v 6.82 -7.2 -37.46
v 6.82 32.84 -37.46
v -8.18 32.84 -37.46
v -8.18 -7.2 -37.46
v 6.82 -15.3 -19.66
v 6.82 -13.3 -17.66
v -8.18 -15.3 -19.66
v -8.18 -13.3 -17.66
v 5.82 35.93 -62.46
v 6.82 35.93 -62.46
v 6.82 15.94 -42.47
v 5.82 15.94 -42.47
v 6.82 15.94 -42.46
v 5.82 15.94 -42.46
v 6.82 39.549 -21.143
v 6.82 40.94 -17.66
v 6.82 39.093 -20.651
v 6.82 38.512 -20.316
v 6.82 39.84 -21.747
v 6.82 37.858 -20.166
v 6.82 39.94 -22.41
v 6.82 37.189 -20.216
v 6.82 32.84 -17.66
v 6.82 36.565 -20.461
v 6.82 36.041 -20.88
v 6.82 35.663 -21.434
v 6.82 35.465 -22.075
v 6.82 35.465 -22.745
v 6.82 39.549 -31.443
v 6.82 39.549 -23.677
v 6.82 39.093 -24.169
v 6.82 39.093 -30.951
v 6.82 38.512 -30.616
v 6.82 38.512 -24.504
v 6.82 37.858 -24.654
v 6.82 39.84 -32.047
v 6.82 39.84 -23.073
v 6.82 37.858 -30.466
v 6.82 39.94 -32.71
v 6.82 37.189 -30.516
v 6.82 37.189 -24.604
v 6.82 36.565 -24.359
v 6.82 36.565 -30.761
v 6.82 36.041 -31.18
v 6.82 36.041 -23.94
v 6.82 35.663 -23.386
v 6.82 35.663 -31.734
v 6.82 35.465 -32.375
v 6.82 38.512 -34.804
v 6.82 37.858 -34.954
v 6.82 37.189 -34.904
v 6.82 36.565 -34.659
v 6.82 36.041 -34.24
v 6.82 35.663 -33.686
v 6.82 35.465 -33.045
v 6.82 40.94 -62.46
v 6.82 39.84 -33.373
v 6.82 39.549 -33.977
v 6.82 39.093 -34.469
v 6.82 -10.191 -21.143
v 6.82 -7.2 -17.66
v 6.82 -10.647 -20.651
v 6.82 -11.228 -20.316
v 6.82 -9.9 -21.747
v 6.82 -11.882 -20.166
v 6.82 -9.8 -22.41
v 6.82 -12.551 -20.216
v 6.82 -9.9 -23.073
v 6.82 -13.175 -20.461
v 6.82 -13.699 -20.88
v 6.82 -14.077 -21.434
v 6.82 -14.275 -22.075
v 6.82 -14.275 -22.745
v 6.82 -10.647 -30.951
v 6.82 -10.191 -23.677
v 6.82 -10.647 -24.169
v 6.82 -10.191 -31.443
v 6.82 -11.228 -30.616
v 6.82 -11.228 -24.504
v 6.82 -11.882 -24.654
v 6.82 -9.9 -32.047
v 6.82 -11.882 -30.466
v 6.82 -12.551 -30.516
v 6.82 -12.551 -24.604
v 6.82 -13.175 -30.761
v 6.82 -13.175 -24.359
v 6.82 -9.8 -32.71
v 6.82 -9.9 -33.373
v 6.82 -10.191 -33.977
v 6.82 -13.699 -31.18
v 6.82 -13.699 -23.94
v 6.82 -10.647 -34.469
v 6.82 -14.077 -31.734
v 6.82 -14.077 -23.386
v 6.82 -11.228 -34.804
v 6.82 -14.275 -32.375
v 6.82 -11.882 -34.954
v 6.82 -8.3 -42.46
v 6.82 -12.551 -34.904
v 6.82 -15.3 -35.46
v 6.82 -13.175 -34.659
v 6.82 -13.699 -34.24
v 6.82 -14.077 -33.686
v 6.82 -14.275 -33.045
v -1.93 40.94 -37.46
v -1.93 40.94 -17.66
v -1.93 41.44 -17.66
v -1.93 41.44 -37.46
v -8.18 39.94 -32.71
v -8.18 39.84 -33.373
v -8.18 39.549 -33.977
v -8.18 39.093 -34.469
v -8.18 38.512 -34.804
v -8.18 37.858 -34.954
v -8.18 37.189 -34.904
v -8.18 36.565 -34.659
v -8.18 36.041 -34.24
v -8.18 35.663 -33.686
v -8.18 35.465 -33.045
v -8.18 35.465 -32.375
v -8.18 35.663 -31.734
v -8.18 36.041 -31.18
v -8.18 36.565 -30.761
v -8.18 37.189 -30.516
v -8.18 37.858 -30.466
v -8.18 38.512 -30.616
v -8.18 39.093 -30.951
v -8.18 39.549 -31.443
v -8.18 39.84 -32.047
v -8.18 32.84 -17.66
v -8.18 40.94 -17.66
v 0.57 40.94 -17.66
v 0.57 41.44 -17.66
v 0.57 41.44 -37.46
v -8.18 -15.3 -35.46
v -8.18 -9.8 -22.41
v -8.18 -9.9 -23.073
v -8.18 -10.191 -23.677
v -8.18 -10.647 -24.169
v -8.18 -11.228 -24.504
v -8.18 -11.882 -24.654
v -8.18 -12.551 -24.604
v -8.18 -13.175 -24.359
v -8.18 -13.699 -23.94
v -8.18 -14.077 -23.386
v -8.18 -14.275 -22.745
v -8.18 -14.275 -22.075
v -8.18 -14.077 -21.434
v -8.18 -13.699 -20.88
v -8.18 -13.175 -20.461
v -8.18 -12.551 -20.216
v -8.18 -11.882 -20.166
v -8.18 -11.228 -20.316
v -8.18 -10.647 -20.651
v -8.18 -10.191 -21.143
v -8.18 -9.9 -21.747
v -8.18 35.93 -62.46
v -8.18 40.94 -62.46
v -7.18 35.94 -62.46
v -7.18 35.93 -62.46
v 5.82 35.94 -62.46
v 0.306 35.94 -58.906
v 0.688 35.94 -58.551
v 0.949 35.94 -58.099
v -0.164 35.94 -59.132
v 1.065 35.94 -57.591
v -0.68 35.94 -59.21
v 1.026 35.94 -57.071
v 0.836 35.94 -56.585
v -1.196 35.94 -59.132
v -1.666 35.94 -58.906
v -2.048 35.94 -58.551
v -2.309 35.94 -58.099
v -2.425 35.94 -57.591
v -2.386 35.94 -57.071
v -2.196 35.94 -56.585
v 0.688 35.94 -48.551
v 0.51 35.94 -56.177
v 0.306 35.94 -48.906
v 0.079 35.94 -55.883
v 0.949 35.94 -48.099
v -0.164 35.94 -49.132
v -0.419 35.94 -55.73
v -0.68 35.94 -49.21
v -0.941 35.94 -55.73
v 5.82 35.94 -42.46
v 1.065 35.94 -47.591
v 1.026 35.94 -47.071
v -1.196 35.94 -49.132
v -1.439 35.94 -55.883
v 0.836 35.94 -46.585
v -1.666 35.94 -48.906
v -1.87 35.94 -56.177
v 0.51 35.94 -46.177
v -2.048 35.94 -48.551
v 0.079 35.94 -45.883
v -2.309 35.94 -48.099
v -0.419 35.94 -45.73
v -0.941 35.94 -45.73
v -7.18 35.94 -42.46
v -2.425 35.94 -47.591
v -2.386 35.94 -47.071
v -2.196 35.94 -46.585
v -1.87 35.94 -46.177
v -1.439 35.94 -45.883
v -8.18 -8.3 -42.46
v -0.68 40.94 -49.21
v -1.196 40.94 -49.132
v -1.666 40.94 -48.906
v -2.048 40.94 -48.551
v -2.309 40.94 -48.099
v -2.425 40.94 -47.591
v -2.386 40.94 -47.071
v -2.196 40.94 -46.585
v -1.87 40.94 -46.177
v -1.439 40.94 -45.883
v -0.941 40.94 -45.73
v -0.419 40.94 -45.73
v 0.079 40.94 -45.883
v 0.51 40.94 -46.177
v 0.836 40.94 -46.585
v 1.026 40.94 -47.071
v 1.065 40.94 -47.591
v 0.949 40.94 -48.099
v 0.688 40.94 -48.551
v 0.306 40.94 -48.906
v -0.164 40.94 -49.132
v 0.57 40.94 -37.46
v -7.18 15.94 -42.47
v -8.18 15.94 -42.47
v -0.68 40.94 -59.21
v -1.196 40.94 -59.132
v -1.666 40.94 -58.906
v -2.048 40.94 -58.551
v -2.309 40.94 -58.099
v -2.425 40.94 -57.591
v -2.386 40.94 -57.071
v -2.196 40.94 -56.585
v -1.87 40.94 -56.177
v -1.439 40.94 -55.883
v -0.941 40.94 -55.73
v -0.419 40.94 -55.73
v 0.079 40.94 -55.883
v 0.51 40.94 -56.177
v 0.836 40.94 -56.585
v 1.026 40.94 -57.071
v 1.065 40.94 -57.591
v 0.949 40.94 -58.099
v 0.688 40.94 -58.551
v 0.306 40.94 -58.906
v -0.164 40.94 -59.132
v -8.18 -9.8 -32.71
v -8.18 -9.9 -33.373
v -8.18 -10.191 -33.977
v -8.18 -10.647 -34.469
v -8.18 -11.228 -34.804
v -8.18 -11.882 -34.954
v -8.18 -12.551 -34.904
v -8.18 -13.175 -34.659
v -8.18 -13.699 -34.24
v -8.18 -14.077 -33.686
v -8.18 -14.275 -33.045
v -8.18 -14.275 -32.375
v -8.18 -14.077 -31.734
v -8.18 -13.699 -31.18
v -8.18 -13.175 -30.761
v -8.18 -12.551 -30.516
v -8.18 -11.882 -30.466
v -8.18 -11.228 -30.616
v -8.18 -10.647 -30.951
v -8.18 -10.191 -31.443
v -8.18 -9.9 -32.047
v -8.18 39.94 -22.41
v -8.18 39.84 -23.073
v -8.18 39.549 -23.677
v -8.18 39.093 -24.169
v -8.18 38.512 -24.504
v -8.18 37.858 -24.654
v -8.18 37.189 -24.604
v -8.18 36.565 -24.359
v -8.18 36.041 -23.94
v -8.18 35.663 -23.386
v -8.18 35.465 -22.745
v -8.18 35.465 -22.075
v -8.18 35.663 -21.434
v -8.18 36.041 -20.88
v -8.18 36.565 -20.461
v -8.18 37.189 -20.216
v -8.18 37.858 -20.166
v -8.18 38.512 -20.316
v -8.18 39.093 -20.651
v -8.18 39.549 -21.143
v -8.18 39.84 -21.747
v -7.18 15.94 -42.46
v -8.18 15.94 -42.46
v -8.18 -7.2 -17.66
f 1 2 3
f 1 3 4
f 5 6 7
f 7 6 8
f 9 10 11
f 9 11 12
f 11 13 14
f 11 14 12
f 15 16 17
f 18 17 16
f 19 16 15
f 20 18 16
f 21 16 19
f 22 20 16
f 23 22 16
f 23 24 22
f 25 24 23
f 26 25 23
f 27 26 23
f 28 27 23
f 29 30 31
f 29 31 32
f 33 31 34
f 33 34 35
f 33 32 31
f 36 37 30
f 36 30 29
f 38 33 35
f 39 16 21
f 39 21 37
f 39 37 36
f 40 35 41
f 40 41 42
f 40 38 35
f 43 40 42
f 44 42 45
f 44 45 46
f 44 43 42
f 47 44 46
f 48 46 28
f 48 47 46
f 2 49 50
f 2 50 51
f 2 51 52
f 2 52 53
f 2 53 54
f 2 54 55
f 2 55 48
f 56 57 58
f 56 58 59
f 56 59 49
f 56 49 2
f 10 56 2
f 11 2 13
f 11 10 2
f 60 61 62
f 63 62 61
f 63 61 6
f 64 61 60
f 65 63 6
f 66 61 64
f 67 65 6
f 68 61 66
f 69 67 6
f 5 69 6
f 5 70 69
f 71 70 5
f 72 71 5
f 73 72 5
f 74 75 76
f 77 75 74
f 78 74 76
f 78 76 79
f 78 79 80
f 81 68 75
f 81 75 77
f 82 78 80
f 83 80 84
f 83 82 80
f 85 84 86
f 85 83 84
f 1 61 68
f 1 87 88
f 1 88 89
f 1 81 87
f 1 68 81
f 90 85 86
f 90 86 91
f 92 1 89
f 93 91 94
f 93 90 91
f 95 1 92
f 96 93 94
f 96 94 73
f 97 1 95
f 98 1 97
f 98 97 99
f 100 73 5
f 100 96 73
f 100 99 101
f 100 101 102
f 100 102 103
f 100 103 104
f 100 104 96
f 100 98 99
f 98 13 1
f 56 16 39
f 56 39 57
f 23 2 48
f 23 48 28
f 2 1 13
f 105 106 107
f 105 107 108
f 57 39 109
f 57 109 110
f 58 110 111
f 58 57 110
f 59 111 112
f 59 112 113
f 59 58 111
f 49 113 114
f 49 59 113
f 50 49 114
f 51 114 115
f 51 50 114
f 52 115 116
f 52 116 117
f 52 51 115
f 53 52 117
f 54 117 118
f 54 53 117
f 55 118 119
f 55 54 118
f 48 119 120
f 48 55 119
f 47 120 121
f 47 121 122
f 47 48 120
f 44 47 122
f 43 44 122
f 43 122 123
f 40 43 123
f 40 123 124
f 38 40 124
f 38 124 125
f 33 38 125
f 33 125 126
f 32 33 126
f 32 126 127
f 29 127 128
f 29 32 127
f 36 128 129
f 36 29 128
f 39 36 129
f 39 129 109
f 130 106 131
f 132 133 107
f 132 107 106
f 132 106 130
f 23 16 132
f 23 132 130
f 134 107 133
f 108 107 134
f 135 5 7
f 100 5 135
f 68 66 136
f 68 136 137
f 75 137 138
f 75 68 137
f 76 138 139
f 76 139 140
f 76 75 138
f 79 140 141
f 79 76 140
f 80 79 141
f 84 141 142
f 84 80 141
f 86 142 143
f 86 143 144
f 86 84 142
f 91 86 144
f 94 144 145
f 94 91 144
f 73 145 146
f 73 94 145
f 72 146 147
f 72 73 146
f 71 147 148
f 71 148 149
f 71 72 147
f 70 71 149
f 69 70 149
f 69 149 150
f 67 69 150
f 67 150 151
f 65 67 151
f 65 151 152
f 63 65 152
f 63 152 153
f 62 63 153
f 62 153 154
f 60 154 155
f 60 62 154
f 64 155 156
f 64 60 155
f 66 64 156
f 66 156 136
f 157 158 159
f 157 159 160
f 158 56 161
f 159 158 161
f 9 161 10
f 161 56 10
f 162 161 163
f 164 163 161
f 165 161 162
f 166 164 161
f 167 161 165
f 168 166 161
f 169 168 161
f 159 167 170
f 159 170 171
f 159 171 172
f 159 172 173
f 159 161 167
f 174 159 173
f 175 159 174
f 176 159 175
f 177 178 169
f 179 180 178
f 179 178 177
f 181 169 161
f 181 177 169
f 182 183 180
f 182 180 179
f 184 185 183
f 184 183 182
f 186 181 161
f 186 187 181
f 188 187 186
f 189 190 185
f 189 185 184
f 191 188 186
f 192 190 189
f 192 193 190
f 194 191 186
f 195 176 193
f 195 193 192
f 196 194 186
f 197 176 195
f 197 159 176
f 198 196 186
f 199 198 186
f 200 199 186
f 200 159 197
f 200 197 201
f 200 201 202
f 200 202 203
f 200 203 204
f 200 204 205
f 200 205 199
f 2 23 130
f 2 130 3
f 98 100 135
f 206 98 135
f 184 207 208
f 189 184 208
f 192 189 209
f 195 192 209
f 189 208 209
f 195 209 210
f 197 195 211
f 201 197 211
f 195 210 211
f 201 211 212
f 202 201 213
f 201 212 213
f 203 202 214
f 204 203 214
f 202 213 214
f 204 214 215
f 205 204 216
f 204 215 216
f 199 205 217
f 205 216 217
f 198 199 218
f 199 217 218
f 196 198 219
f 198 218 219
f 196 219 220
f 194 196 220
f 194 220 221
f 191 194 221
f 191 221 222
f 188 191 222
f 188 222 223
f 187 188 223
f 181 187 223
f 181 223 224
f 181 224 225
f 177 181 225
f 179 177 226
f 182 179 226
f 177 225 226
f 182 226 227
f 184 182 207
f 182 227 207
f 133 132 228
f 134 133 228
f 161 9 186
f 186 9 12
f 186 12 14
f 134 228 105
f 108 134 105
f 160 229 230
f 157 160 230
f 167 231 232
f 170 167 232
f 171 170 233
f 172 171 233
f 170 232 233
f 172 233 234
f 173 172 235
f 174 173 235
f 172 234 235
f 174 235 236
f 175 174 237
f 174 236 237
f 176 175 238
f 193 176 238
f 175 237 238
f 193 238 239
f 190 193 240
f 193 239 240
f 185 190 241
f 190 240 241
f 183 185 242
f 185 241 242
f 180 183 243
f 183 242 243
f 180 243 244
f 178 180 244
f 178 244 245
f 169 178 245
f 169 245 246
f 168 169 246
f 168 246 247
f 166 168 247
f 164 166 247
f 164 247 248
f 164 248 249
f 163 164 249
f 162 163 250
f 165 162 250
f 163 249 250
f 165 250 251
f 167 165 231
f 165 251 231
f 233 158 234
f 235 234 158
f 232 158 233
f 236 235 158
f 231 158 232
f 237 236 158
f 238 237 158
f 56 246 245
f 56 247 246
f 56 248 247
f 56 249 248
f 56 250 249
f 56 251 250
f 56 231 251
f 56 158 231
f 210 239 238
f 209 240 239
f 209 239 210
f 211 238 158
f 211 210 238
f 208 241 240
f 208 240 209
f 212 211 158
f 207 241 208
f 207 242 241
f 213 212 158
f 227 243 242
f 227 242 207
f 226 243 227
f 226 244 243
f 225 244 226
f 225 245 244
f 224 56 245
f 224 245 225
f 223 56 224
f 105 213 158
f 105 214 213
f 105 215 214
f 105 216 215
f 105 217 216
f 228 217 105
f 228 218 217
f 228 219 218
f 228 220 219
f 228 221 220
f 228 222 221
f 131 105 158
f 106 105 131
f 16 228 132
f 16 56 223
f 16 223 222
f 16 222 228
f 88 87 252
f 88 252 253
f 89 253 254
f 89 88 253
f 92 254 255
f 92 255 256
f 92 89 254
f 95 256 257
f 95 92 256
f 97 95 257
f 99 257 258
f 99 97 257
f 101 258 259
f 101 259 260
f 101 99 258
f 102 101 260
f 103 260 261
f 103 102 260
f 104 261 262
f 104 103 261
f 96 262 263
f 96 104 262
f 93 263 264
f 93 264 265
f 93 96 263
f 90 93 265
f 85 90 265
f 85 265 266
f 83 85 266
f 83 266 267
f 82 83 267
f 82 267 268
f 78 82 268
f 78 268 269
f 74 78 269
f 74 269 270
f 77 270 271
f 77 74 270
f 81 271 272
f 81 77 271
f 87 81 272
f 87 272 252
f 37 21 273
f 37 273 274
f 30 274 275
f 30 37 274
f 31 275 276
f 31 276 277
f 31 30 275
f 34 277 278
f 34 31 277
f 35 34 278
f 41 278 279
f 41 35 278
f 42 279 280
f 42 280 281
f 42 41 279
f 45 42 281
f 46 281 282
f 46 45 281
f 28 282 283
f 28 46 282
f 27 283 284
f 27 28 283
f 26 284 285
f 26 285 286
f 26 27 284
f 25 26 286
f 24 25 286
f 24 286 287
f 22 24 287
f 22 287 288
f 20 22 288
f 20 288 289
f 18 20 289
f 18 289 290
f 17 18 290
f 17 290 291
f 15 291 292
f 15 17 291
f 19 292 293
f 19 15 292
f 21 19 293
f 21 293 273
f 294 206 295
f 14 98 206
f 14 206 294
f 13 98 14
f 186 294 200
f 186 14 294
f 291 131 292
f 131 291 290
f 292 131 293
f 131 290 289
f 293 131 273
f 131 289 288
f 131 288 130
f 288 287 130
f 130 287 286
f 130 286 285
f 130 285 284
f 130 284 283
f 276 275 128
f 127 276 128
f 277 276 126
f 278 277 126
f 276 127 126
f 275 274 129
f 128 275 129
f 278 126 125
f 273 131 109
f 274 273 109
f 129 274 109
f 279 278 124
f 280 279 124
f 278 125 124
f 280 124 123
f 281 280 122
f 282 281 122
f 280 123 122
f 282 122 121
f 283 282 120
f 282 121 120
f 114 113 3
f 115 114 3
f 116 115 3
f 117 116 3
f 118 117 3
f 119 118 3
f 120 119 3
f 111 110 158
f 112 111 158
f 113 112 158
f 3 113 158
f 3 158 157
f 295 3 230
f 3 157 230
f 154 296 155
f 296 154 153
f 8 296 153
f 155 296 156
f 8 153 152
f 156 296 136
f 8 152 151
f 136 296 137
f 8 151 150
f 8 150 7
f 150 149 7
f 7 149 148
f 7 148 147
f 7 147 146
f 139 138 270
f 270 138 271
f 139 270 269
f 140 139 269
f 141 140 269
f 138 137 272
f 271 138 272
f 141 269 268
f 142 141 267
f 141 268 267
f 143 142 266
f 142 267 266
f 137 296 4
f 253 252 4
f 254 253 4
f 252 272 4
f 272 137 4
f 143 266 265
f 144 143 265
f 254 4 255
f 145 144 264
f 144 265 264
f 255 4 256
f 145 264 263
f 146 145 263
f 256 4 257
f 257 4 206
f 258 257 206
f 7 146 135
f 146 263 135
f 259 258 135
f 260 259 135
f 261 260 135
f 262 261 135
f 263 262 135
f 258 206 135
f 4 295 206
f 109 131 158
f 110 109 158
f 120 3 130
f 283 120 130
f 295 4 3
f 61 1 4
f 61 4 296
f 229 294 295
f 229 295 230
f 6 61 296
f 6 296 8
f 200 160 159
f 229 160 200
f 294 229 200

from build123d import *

# Parameters (mm, degrees)
SKETCH019_R             = 2.25
PAD011_DEPTH            = 15
SKETCH020_W             = 20
SKETCH020_H             = 13
POCKET005_DEPTH         = 20
CHAMFER_SIZE            = 19.99
SKETCH021_R             = 1.75
POCKET006_DEPTH         = 5
SKETCH022_W             = 19.8
SKETCH022_H             = 2.5
PAD012_DEPTH            = 0.5
CHAMFER001_SIZE         = 7
CHAMFER002_SIZE         = 2
BODY003_PLACEMENT_ANGLE = 180


with BuildPart() as part:
    # Sketch019 → Pad011 (new body)
    with BuildSketch(Plane.YZ):
        Polygon((-20.02, -9.9), (-28.12, -9.9), (-28.12, 14.9), (3.12, 14.9), (3.12, 34.9), (23.12, 34.9), (28.12, 34.9), (28.12, -9.9), (20.02, -9.9), (20.02, 9.9), (-20.02, 9.9), align=None)
        with Locations((-24.87, -5.15)):
            Circle(SKETCH019_R, mode=Mode.SUBTRACT)
        with Locations((-24.87, 5.15)):
            Circle(SKETCH019_R, mode=Mode.SUBTRACT)
        with Locations((24.87, -5.15)):
            Circle(SKETCH019_R, mode=Mode.SUBTRACT)
        with Locations((24.87, 5.15)):
            Circle(SKETCH019_R, mode=Mode.SUBTRACT)
    extrude(amount=PAD011_DEPTH)

    # Sketch020 (on Face5 of Pad011) → Pocket005 (cut)
    with BuildSketch(Plane(origin=(0, 3.12, 0), x_dir=(0, 0, -1), z_dir=(0, -1, 0))):
        with Locations((-24.9, 7.5)):
            Rectangle(SKETCH020_W, SKETCH020_H)
    extrude(amount=-POCKET005_DEPTH, mode=Mode.SUBTRACT)

    # Chamfer
    chamfer_edges = [part.edges().sort_by_distance(p)[0] for p in [
        (14.5, 3.12, 34.9),
        (0.5, 3.12, 34.9),
    ]]
    chamfer(chamfer_edges, length=CHAMFER_SIZE)

    # Sketch021 (on Face9 of Chamfer) → Pocket006 (cut)
    with BuildSketch(Plane.ZX.offset(28.12)):
        with Locations((19.9, 7.5)):
            Circle(SKETCH021_R)
        with Locations((29.9, 7.5)):
            Circle(SKETCH021_R)
    extrude(amount=-POCKET006_DEPTH, mode=Mode.SUBTRACT)

    # Sketch022 (on Face9 of Pocket006) → Pad012 (join)
    with BuildSketch(Plane.ZX.offset(28.12)):
        with Locations((0, 7.5)):
            Rectangle(SKETCH022_W, SKETCH022_H)
    extrude(amount=PAD012_DEPTH)

    # Chamfer001
    chamfer001_edges = [part.edges().sort_by_distance(p)[0] for p in [
        (7.5, -28.12, 14.9),
    ]]
    chamfer(chamfer001_edges, length=CHAMFER001_SIZE)

    # Chamfer002
    chamfer002_edges = [part.edges().sort_by_distance(p)[0] for p in [
        (7.5, -28.12, -9.9),
    ]]
    chamfer(chamfer002_edges, length=CHAMFER002_SIZE)


with BuildPart() as part_1:
    # Body003 placement: moved
    add(part.part.moved(Location((6.82, 12.82, -27.56))).rotate(Axis((6.82, 12.82, -27.56), (0, 1, 0)), BODY003_PLACEMENT_ANGLE))


solid = part_1.part
